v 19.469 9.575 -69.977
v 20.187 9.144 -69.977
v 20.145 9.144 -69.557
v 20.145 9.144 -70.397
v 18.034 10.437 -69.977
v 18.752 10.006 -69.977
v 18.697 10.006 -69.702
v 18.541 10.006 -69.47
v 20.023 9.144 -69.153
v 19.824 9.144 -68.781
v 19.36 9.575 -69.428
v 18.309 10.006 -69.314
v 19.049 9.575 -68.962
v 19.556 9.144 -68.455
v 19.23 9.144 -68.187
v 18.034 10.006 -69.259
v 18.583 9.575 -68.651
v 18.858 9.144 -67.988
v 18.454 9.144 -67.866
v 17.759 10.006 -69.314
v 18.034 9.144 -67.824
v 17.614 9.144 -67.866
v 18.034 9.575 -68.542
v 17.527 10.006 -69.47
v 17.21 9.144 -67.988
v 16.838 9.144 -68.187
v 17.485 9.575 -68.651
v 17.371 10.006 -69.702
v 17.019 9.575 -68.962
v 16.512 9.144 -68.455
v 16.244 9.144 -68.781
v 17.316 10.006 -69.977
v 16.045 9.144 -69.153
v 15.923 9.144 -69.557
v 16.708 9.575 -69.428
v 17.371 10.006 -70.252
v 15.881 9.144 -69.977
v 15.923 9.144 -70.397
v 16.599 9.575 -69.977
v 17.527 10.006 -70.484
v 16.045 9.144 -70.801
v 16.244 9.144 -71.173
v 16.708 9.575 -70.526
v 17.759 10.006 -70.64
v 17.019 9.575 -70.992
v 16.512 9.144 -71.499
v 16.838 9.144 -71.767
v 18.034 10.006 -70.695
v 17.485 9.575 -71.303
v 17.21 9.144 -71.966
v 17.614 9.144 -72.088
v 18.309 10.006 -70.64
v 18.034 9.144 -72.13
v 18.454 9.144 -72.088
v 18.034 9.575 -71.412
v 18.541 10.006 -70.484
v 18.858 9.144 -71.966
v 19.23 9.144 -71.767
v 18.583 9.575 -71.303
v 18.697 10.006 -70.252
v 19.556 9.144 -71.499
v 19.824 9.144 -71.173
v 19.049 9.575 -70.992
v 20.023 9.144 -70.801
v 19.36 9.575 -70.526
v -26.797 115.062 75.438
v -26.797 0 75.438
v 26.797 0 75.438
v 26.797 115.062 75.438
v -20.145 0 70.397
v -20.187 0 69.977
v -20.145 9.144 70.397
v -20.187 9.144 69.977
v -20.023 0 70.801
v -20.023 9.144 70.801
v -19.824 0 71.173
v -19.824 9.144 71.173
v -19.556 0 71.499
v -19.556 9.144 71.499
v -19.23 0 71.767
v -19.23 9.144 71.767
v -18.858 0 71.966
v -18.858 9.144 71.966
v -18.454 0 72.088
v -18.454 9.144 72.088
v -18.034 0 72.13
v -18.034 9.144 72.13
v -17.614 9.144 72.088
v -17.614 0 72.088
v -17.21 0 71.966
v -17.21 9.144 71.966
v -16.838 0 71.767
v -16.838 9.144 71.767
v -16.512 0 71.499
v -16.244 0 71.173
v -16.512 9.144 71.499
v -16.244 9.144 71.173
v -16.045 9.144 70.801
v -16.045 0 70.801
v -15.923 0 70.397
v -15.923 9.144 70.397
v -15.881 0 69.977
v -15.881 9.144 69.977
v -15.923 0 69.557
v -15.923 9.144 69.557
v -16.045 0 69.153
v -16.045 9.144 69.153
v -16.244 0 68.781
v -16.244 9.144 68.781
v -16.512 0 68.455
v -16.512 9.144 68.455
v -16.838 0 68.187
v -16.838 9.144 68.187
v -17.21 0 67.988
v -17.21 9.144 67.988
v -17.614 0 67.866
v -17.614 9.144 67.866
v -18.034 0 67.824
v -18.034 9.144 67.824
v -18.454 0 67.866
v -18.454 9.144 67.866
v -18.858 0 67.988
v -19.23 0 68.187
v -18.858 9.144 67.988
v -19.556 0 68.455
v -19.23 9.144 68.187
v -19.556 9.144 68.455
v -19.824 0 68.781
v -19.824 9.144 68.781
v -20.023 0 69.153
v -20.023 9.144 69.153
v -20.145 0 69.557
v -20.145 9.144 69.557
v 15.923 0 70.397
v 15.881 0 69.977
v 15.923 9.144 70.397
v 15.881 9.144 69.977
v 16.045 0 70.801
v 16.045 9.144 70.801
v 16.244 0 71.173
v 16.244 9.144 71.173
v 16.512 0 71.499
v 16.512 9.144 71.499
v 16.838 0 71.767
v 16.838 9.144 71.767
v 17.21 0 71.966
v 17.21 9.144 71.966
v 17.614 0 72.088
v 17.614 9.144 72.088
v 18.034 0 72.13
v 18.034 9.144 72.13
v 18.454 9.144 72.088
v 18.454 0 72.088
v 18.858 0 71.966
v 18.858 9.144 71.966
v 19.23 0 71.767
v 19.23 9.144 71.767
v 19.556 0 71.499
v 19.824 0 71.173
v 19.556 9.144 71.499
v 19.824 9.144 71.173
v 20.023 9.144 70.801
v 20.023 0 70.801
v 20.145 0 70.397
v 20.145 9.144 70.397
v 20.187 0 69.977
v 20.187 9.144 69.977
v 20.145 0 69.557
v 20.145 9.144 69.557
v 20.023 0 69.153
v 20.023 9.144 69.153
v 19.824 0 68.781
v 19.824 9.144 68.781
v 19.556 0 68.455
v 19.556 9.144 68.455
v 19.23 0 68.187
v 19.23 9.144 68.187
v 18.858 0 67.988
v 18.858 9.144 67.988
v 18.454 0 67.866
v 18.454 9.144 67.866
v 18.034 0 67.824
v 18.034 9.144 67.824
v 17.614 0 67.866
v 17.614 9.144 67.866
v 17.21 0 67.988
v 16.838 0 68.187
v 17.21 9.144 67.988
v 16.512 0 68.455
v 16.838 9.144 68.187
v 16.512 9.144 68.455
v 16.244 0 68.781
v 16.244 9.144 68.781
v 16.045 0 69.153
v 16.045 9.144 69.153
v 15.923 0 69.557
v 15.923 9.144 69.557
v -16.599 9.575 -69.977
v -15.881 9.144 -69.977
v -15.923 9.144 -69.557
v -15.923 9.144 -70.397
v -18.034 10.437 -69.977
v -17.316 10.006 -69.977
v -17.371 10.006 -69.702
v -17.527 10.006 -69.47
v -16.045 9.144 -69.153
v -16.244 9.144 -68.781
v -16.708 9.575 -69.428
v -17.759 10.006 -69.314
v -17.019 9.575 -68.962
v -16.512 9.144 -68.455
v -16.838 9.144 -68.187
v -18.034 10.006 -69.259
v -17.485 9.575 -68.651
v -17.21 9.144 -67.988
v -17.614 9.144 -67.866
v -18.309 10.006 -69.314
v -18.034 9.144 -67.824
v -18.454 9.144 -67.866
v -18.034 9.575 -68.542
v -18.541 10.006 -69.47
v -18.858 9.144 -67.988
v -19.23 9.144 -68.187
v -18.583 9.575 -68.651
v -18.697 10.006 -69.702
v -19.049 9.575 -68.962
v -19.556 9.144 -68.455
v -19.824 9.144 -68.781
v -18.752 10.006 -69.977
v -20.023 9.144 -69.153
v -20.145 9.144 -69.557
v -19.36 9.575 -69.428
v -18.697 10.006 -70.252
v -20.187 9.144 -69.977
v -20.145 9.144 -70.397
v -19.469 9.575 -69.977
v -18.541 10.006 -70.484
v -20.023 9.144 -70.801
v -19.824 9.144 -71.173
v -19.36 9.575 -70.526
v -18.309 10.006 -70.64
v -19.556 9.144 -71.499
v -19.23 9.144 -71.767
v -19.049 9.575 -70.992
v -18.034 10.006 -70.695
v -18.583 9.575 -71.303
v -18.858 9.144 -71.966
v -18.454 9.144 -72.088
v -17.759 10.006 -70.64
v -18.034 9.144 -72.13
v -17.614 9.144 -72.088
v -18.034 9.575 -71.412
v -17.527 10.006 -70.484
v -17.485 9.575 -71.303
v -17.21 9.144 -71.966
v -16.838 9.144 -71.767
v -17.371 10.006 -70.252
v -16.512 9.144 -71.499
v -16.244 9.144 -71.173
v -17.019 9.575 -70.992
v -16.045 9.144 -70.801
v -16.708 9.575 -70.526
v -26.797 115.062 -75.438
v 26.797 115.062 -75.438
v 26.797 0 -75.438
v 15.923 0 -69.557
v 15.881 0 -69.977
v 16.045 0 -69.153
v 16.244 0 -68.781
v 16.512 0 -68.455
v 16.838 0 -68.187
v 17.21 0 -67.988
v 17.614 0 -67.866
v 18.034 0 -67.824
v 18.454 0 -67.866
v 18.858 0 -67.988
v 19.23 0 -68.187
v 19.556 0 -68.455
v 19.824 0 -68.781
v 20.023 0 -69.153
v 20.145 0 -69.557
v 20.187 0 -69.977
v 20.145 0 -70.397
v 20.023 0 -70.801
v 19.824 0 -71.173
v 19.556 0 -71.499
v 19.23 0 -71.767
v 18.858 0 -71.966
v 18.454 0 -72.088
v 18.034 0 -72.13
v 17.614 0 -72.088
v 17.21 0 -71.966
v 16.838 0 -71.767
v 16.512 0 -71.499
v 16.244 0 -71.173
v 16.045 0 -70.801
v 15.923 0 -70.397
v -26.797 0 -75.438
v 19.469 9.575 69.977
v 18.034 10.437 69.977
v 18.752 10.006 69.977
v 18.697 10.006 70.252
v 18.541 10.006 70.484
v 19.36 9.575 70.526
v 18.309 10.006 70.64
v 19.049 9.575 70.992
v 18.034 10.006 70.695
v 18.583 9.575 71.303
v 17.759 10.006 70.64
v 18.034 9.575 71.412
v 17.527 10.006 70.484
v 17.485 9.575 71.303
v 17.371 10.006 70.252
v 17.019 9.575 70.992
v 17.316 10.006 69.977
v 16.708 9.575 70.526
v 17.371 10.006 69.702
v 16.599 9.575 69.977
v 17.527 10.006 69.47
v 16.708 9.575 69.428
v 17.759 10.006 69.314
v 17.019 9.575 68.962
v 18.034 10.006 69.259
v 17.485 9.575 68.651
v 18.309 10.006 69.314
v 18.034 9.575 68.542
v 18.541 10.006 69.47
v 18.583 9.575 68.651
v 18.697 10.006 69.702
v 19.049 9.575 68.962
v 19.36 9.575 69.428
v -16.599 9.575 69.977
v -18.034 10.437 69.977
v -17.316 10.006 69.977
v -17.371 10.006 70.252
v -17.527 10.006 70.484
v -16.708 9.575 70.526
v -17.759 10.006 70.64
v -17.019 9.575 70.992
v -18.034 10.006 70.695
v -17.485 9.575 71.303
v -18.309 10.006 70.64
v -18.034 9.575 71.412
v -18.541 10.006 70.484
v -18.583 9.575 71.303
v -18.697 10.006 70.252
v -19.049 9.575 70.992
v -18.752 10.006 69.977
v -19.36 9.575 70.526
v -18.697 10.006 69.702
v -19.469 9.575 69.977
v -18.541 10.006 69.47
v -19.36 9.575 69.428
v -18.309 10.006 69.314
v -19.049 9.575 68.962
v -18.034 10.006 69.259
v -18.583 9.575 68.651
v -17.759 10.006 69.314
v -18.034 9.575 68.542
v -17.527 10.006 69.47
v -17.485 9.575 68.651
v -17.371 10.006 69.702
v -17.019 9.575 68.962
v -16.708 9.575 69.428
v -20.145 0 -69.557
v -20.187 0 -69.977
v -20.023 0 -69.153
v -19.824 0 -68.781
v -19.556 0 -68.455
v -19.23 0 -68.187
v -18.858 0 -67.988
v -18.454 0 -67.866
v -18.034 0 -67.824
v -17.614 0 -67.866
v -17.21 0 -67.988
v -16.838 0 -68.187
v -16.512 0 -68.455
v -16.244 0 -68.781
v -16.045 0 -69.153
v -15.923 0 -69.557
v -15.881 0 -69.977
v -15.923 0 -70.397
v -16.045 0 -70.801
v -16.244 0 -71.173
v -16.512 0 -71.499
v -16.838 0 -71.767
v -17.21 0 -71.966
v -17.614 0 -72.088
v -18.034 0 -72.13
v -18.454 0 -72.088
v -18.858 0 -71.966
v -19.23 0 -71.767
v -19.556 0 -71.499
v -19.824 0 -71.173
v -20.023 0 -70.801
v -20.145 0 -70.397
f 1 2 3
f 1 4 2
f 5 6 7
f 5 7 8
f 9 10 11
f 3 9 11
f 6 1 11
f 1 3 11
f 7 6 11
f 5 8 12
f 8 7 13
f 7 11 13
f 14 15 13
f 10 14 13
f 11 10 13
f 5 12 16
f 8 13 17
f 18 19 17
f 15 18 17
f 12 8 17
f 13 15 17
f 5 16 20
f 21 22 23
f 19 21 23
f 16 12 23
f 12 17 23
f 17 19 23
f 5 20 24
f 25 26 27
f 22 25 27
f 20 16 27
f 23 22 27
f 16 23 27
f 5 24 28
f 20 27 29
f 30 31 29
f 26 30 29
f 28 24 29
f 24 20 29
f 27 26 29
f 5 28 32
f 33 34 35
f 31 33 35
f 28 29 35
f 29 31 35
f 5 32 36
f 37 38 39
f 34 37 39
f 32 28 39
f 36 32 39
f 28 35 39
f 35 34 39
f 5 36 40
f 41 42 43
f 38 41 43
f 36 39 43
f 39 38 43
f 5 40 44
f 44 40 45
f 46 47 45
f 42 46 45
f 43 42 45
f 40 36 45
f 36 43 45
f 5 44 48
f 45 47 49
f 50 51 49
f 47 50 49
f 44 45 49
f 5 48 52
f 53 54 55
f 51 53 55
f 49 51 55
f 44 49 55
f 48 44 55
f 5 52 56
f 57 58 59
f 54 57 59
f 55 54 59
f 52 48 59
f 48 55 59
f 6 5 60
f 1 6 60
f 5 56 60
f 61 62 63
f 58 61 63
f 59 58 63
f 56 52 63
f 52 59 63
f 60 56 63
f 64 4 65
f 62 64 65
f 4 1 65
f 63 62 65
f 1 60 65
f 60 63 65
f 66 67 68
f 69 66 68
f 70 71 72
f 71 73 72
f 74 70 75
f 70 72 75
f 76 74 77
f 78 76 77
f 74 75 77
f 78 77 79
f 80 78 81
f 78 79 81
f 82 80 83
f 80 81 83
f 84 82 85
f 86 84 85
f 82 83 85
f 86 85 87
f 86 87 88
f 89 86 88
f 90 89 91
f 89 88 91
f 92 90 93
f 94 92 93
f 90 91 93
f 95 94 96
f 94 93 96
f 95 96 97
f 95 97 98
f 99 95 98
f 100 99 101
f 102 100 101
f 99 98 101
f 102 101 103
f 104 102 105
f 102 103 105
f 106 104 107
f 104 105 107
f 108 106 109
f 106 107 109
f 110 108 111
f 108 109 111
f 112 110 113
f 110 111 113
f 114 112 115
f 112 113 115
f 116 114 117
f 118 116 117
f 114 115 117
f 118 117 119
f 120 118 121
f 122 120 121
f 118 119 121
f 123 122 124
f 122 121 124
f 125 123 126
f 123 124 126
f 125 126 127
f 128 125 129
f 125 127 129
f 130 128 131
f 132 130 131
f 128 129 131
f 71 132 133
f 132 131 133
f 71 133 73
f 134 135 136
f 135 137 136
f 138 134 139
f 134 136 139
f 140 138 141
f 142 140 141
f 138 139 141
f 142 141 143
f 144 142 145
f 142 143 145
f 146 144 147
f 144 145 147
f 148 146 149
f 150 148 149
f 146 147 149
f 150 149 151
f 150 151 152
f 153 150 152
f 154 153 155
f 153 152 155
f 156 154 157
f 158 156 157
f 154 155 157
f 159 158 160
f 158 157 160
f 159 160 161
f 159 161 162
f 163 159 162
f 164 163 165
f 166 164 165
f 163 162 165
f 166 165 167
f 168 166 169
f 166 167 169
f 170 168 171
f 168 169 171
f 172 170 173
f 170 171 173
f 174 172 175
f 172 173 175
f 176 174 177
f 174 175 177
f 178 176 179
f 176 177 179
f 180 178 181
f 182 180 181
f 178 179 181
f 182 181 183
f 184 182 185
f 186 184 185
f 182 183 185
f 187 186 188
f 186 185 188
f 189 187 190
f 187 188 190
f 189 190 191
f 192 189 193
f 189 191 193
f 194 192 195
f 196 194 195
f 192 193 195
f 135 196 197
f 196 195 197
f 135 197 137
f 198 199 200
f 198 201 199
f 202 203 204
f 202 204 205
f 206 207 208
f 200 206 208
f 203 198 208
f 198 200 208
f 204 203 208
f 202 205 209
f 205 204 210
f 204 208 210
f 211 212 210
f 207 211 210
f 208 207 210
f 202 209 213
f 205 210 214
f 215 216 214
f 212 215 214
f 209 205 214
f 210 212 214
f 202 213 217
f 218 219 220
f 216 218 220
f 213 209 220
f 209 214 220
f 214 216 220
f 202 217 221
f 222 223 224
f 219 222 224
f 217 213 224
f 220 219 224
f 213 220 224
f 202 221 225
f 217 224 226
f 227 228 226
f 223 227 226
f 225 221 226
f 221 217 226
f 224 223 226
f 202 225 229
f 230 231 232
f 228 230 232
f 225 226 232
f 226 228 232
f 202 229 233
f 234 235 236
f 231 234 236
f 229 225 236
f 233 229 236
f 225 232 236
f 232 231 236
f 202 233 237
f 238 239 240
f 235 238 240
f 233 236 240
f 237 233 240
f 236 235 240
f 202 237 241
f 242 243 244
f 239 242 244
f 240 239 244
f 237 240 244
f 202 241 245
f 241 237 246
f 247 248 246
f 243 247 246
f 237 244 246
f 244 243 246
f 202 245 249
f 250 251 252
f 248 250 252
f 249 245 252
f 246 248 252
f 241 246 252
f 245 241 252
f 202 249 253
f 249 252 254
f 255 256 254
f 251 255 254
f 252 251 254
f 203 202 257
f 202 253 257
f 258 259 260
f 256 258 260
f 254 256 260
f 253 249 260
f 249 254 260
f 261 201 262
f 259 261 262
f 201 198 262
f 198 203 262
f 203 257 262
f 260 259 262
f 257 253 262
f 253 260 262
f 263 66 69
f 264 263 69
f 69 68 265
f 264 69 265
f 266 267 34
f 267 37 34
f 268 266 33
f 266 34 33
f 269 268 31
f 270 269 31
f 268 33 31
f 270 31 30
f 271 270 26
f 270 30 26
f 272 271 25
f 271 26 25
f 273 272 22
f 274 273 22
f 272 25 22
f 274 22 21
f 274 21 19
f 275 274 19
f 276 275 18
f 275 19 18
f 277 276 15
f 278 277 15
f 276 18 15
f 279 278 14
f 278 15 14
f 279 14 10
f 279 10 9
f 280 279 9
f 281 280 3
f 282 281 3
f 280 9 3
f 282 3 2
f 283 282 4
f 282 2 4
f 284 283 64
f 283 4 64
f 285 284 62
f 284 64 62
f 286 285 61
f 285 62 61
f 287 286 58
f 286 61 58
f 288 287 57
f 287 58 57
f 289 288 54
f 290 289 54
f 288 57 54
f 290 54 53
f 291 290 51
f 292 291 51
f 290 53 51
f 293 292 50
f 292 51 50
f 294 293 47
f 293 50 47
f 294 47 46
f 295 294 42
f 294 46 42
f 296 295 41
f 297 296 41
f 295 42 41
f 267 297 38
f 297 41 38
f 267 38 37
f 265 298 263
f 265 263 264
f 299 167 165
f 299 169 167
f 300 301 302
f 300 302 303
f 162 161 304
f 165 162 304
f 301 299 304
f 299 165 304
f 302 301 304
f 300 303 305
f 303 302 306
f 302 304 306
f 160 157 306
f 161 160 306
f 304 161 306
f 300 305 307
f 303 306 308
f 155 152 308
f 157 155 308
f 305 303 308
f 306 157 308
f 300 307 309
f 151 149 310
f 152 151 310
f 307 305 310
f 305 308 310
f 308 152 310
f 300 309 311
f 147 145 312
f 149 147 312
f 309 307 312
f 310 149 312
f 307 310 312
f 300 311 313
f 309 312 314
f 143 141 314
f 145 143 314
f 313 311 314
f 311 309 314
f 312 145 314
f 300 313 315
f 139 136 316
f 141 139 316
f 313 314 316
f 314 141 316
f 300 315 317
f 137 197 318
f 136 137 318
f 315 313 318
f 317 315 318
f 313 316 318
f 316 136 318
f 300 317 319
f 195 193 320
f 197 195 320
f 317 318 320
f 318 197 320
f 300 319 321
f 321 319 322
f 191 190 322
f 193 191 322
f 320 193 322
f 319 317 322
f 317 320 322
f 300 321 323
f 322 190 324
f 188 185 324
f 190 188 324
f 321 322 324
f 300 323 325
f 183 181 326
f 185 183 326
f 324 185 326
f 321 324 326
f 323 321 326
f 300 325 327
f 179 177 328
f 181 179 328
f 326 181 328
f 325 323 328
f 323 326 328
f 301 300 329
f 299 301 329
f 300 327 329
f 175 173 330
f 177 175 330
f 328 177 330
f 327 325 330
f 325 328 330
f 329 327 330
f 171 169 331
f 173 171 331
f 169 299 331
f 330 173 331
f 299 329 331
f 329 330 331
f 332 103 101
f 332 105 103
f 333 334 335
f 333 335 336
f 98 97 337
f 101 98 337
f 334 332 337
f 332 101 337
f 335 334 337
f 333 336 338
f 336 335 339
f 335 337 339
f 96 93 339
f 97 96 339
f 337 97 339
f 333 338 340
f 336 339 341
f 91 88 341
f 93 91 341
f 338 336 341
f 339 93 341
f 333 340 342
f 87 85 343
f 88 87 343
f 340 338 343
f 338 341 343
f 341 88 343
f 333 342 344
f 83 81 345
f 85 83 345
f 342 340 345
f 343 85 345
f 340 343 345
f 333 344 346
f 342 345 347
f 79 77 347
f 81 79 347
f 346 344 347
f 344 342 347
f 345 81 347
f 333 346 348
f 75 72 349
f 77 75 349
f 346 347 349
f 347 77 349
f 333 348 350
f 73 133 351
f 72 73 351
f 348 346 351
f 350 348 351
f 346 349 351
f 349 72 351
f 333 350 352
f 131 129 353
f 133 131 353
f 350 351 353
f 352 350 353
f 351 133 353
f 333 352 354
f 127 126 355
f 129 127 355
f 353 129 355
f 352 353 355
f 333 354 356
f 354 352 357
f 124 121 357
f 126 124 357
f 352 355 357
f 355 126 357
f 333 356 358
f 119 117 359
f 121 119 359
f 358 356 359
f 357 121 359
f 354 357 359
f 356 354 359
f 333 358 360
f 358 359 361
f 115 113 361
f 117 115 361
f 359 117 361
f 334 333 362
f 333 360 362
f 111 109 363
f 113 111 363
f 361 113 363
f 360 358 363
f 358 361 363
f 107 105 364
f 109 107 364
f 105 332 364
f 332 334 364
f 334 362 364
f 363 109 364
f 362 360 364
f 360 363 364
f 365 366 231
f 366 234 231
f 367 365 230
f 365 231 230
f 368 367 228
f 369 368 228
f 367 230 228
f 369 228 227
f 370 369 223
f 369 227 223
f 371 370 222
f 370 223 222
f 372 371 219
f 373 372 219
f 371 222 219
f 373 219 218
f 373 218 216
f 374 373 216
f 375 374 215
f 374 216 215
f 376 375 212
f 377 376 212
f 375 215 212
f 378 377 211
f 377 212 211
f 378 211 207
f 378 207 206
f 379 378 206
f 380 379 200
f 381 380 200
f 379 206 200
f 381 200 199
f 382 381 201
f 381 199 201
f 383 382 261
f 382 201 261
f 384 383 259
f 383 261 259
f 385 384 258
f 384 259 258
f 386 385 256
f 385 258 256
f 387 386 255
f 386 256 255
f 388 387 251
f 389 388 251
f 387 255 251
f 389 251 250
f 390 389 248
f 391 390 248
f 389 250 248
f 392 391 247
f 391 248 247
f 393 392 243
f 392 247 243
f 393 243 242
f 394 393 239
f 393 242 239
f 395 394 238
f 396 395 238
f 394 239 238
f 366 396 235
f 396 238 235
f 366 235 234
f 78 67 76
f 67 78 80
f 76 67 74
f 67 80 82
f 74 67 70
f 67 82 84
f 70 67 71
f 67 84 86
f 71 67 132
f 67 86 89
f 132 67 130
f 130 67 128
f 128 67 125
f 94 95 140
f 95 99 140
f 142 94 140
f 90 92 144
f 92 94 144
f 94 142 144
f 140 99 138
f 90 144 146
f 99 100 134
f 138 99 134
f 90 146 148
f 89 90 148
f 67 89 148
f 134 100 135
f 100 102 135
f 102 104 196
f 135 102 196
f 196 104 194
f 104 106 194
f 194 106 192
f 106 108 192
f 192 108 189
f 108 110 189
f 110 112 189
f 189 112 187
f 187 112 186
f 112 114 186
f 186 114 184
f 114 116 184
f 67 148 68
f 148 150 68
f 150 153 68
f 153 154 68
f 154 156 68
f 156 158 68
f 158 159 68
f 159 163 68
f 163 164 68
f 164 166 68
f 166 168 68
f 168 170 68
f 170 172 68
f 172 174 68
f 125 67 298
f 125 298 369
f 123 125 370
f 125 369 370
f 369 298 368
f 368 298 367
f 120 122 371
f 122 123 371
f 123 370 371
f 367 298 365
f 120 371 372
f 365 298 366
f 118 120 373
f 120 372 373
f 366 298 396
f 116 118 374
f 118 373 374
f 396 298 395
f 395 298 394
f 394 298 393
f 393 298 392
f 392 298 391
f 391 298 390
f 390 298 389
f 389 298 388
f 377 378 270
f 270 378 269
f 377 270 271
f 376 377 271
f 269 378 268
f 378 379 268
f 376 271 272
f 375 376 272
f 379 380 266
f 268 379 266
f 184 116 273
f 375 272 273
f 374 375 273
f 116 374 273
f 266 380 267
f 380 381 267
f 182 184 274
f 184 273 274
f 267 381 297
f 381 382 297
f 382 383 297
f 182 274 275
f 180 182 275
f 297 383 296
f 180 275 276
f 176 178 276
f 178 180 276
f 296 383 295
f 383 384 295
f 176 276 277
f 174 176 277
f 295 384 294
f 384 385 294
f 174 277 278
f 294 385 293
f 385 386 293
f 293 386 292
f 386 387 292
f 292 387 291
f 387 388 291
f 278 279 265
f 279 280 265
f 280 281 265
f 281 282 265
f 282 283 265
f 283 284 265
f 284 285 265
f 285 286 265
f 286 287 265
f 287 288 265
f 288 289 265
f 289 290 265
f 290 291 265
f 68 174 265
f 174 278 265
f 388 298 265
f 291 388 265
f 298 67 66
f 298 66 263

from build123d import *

# Parameters (mm, degrees)
SKETCH1_W                 = 53.594
SKETCH1_H                 = 150.876
BOSS_EXTRUDE1_DEPTH       = 115.062
F_6_CLEARANCE_HOLE1_D     = 4.3053
F_6_CLEARANCE_HOLE1_DEPTH = 9.144
F_6_CLEARANCE_HOLE1_TIP   = 1.293442612


with BuildPart() as part:
    # Sketch1 → Boss-Extrude1 (new body)
    with BuildSketch(Plane(origin=(0, 0, 0), x_dir=(1, 0, 0), z_dir=(0, 1, 0))):
        Rectangle(SKETCH1_W, SKETCH1_H)
    extrude(amount=BOSS_EXTRUDE1_DEPTH)

    # #6 Clearance Hole1
    with Locations(Plane.XZ):
        with Locations((18.034, 69.977), (-18.034, 69.977), (-18.034, -69.977), (18.034, -69.977)):
            Hole(F_6_CLEARANCE_HOLE1_D / 2, depth=F_6_CLEARANCE_HOLE1_DEPTH)
            with Locations((0, 0, -(F_6_CLEARANCE_HOLE1_DEPTH + F_6_CLEARANCE_HOLE1_TIP / 2))):  # 118° drill point
                Cone(0, F_6_CLEARANCE_HOLE1_D / 2, F_6_CLEARANCE_HOLE1_TIP, mode=Mode.SUBTRACT)


solid = part.part
